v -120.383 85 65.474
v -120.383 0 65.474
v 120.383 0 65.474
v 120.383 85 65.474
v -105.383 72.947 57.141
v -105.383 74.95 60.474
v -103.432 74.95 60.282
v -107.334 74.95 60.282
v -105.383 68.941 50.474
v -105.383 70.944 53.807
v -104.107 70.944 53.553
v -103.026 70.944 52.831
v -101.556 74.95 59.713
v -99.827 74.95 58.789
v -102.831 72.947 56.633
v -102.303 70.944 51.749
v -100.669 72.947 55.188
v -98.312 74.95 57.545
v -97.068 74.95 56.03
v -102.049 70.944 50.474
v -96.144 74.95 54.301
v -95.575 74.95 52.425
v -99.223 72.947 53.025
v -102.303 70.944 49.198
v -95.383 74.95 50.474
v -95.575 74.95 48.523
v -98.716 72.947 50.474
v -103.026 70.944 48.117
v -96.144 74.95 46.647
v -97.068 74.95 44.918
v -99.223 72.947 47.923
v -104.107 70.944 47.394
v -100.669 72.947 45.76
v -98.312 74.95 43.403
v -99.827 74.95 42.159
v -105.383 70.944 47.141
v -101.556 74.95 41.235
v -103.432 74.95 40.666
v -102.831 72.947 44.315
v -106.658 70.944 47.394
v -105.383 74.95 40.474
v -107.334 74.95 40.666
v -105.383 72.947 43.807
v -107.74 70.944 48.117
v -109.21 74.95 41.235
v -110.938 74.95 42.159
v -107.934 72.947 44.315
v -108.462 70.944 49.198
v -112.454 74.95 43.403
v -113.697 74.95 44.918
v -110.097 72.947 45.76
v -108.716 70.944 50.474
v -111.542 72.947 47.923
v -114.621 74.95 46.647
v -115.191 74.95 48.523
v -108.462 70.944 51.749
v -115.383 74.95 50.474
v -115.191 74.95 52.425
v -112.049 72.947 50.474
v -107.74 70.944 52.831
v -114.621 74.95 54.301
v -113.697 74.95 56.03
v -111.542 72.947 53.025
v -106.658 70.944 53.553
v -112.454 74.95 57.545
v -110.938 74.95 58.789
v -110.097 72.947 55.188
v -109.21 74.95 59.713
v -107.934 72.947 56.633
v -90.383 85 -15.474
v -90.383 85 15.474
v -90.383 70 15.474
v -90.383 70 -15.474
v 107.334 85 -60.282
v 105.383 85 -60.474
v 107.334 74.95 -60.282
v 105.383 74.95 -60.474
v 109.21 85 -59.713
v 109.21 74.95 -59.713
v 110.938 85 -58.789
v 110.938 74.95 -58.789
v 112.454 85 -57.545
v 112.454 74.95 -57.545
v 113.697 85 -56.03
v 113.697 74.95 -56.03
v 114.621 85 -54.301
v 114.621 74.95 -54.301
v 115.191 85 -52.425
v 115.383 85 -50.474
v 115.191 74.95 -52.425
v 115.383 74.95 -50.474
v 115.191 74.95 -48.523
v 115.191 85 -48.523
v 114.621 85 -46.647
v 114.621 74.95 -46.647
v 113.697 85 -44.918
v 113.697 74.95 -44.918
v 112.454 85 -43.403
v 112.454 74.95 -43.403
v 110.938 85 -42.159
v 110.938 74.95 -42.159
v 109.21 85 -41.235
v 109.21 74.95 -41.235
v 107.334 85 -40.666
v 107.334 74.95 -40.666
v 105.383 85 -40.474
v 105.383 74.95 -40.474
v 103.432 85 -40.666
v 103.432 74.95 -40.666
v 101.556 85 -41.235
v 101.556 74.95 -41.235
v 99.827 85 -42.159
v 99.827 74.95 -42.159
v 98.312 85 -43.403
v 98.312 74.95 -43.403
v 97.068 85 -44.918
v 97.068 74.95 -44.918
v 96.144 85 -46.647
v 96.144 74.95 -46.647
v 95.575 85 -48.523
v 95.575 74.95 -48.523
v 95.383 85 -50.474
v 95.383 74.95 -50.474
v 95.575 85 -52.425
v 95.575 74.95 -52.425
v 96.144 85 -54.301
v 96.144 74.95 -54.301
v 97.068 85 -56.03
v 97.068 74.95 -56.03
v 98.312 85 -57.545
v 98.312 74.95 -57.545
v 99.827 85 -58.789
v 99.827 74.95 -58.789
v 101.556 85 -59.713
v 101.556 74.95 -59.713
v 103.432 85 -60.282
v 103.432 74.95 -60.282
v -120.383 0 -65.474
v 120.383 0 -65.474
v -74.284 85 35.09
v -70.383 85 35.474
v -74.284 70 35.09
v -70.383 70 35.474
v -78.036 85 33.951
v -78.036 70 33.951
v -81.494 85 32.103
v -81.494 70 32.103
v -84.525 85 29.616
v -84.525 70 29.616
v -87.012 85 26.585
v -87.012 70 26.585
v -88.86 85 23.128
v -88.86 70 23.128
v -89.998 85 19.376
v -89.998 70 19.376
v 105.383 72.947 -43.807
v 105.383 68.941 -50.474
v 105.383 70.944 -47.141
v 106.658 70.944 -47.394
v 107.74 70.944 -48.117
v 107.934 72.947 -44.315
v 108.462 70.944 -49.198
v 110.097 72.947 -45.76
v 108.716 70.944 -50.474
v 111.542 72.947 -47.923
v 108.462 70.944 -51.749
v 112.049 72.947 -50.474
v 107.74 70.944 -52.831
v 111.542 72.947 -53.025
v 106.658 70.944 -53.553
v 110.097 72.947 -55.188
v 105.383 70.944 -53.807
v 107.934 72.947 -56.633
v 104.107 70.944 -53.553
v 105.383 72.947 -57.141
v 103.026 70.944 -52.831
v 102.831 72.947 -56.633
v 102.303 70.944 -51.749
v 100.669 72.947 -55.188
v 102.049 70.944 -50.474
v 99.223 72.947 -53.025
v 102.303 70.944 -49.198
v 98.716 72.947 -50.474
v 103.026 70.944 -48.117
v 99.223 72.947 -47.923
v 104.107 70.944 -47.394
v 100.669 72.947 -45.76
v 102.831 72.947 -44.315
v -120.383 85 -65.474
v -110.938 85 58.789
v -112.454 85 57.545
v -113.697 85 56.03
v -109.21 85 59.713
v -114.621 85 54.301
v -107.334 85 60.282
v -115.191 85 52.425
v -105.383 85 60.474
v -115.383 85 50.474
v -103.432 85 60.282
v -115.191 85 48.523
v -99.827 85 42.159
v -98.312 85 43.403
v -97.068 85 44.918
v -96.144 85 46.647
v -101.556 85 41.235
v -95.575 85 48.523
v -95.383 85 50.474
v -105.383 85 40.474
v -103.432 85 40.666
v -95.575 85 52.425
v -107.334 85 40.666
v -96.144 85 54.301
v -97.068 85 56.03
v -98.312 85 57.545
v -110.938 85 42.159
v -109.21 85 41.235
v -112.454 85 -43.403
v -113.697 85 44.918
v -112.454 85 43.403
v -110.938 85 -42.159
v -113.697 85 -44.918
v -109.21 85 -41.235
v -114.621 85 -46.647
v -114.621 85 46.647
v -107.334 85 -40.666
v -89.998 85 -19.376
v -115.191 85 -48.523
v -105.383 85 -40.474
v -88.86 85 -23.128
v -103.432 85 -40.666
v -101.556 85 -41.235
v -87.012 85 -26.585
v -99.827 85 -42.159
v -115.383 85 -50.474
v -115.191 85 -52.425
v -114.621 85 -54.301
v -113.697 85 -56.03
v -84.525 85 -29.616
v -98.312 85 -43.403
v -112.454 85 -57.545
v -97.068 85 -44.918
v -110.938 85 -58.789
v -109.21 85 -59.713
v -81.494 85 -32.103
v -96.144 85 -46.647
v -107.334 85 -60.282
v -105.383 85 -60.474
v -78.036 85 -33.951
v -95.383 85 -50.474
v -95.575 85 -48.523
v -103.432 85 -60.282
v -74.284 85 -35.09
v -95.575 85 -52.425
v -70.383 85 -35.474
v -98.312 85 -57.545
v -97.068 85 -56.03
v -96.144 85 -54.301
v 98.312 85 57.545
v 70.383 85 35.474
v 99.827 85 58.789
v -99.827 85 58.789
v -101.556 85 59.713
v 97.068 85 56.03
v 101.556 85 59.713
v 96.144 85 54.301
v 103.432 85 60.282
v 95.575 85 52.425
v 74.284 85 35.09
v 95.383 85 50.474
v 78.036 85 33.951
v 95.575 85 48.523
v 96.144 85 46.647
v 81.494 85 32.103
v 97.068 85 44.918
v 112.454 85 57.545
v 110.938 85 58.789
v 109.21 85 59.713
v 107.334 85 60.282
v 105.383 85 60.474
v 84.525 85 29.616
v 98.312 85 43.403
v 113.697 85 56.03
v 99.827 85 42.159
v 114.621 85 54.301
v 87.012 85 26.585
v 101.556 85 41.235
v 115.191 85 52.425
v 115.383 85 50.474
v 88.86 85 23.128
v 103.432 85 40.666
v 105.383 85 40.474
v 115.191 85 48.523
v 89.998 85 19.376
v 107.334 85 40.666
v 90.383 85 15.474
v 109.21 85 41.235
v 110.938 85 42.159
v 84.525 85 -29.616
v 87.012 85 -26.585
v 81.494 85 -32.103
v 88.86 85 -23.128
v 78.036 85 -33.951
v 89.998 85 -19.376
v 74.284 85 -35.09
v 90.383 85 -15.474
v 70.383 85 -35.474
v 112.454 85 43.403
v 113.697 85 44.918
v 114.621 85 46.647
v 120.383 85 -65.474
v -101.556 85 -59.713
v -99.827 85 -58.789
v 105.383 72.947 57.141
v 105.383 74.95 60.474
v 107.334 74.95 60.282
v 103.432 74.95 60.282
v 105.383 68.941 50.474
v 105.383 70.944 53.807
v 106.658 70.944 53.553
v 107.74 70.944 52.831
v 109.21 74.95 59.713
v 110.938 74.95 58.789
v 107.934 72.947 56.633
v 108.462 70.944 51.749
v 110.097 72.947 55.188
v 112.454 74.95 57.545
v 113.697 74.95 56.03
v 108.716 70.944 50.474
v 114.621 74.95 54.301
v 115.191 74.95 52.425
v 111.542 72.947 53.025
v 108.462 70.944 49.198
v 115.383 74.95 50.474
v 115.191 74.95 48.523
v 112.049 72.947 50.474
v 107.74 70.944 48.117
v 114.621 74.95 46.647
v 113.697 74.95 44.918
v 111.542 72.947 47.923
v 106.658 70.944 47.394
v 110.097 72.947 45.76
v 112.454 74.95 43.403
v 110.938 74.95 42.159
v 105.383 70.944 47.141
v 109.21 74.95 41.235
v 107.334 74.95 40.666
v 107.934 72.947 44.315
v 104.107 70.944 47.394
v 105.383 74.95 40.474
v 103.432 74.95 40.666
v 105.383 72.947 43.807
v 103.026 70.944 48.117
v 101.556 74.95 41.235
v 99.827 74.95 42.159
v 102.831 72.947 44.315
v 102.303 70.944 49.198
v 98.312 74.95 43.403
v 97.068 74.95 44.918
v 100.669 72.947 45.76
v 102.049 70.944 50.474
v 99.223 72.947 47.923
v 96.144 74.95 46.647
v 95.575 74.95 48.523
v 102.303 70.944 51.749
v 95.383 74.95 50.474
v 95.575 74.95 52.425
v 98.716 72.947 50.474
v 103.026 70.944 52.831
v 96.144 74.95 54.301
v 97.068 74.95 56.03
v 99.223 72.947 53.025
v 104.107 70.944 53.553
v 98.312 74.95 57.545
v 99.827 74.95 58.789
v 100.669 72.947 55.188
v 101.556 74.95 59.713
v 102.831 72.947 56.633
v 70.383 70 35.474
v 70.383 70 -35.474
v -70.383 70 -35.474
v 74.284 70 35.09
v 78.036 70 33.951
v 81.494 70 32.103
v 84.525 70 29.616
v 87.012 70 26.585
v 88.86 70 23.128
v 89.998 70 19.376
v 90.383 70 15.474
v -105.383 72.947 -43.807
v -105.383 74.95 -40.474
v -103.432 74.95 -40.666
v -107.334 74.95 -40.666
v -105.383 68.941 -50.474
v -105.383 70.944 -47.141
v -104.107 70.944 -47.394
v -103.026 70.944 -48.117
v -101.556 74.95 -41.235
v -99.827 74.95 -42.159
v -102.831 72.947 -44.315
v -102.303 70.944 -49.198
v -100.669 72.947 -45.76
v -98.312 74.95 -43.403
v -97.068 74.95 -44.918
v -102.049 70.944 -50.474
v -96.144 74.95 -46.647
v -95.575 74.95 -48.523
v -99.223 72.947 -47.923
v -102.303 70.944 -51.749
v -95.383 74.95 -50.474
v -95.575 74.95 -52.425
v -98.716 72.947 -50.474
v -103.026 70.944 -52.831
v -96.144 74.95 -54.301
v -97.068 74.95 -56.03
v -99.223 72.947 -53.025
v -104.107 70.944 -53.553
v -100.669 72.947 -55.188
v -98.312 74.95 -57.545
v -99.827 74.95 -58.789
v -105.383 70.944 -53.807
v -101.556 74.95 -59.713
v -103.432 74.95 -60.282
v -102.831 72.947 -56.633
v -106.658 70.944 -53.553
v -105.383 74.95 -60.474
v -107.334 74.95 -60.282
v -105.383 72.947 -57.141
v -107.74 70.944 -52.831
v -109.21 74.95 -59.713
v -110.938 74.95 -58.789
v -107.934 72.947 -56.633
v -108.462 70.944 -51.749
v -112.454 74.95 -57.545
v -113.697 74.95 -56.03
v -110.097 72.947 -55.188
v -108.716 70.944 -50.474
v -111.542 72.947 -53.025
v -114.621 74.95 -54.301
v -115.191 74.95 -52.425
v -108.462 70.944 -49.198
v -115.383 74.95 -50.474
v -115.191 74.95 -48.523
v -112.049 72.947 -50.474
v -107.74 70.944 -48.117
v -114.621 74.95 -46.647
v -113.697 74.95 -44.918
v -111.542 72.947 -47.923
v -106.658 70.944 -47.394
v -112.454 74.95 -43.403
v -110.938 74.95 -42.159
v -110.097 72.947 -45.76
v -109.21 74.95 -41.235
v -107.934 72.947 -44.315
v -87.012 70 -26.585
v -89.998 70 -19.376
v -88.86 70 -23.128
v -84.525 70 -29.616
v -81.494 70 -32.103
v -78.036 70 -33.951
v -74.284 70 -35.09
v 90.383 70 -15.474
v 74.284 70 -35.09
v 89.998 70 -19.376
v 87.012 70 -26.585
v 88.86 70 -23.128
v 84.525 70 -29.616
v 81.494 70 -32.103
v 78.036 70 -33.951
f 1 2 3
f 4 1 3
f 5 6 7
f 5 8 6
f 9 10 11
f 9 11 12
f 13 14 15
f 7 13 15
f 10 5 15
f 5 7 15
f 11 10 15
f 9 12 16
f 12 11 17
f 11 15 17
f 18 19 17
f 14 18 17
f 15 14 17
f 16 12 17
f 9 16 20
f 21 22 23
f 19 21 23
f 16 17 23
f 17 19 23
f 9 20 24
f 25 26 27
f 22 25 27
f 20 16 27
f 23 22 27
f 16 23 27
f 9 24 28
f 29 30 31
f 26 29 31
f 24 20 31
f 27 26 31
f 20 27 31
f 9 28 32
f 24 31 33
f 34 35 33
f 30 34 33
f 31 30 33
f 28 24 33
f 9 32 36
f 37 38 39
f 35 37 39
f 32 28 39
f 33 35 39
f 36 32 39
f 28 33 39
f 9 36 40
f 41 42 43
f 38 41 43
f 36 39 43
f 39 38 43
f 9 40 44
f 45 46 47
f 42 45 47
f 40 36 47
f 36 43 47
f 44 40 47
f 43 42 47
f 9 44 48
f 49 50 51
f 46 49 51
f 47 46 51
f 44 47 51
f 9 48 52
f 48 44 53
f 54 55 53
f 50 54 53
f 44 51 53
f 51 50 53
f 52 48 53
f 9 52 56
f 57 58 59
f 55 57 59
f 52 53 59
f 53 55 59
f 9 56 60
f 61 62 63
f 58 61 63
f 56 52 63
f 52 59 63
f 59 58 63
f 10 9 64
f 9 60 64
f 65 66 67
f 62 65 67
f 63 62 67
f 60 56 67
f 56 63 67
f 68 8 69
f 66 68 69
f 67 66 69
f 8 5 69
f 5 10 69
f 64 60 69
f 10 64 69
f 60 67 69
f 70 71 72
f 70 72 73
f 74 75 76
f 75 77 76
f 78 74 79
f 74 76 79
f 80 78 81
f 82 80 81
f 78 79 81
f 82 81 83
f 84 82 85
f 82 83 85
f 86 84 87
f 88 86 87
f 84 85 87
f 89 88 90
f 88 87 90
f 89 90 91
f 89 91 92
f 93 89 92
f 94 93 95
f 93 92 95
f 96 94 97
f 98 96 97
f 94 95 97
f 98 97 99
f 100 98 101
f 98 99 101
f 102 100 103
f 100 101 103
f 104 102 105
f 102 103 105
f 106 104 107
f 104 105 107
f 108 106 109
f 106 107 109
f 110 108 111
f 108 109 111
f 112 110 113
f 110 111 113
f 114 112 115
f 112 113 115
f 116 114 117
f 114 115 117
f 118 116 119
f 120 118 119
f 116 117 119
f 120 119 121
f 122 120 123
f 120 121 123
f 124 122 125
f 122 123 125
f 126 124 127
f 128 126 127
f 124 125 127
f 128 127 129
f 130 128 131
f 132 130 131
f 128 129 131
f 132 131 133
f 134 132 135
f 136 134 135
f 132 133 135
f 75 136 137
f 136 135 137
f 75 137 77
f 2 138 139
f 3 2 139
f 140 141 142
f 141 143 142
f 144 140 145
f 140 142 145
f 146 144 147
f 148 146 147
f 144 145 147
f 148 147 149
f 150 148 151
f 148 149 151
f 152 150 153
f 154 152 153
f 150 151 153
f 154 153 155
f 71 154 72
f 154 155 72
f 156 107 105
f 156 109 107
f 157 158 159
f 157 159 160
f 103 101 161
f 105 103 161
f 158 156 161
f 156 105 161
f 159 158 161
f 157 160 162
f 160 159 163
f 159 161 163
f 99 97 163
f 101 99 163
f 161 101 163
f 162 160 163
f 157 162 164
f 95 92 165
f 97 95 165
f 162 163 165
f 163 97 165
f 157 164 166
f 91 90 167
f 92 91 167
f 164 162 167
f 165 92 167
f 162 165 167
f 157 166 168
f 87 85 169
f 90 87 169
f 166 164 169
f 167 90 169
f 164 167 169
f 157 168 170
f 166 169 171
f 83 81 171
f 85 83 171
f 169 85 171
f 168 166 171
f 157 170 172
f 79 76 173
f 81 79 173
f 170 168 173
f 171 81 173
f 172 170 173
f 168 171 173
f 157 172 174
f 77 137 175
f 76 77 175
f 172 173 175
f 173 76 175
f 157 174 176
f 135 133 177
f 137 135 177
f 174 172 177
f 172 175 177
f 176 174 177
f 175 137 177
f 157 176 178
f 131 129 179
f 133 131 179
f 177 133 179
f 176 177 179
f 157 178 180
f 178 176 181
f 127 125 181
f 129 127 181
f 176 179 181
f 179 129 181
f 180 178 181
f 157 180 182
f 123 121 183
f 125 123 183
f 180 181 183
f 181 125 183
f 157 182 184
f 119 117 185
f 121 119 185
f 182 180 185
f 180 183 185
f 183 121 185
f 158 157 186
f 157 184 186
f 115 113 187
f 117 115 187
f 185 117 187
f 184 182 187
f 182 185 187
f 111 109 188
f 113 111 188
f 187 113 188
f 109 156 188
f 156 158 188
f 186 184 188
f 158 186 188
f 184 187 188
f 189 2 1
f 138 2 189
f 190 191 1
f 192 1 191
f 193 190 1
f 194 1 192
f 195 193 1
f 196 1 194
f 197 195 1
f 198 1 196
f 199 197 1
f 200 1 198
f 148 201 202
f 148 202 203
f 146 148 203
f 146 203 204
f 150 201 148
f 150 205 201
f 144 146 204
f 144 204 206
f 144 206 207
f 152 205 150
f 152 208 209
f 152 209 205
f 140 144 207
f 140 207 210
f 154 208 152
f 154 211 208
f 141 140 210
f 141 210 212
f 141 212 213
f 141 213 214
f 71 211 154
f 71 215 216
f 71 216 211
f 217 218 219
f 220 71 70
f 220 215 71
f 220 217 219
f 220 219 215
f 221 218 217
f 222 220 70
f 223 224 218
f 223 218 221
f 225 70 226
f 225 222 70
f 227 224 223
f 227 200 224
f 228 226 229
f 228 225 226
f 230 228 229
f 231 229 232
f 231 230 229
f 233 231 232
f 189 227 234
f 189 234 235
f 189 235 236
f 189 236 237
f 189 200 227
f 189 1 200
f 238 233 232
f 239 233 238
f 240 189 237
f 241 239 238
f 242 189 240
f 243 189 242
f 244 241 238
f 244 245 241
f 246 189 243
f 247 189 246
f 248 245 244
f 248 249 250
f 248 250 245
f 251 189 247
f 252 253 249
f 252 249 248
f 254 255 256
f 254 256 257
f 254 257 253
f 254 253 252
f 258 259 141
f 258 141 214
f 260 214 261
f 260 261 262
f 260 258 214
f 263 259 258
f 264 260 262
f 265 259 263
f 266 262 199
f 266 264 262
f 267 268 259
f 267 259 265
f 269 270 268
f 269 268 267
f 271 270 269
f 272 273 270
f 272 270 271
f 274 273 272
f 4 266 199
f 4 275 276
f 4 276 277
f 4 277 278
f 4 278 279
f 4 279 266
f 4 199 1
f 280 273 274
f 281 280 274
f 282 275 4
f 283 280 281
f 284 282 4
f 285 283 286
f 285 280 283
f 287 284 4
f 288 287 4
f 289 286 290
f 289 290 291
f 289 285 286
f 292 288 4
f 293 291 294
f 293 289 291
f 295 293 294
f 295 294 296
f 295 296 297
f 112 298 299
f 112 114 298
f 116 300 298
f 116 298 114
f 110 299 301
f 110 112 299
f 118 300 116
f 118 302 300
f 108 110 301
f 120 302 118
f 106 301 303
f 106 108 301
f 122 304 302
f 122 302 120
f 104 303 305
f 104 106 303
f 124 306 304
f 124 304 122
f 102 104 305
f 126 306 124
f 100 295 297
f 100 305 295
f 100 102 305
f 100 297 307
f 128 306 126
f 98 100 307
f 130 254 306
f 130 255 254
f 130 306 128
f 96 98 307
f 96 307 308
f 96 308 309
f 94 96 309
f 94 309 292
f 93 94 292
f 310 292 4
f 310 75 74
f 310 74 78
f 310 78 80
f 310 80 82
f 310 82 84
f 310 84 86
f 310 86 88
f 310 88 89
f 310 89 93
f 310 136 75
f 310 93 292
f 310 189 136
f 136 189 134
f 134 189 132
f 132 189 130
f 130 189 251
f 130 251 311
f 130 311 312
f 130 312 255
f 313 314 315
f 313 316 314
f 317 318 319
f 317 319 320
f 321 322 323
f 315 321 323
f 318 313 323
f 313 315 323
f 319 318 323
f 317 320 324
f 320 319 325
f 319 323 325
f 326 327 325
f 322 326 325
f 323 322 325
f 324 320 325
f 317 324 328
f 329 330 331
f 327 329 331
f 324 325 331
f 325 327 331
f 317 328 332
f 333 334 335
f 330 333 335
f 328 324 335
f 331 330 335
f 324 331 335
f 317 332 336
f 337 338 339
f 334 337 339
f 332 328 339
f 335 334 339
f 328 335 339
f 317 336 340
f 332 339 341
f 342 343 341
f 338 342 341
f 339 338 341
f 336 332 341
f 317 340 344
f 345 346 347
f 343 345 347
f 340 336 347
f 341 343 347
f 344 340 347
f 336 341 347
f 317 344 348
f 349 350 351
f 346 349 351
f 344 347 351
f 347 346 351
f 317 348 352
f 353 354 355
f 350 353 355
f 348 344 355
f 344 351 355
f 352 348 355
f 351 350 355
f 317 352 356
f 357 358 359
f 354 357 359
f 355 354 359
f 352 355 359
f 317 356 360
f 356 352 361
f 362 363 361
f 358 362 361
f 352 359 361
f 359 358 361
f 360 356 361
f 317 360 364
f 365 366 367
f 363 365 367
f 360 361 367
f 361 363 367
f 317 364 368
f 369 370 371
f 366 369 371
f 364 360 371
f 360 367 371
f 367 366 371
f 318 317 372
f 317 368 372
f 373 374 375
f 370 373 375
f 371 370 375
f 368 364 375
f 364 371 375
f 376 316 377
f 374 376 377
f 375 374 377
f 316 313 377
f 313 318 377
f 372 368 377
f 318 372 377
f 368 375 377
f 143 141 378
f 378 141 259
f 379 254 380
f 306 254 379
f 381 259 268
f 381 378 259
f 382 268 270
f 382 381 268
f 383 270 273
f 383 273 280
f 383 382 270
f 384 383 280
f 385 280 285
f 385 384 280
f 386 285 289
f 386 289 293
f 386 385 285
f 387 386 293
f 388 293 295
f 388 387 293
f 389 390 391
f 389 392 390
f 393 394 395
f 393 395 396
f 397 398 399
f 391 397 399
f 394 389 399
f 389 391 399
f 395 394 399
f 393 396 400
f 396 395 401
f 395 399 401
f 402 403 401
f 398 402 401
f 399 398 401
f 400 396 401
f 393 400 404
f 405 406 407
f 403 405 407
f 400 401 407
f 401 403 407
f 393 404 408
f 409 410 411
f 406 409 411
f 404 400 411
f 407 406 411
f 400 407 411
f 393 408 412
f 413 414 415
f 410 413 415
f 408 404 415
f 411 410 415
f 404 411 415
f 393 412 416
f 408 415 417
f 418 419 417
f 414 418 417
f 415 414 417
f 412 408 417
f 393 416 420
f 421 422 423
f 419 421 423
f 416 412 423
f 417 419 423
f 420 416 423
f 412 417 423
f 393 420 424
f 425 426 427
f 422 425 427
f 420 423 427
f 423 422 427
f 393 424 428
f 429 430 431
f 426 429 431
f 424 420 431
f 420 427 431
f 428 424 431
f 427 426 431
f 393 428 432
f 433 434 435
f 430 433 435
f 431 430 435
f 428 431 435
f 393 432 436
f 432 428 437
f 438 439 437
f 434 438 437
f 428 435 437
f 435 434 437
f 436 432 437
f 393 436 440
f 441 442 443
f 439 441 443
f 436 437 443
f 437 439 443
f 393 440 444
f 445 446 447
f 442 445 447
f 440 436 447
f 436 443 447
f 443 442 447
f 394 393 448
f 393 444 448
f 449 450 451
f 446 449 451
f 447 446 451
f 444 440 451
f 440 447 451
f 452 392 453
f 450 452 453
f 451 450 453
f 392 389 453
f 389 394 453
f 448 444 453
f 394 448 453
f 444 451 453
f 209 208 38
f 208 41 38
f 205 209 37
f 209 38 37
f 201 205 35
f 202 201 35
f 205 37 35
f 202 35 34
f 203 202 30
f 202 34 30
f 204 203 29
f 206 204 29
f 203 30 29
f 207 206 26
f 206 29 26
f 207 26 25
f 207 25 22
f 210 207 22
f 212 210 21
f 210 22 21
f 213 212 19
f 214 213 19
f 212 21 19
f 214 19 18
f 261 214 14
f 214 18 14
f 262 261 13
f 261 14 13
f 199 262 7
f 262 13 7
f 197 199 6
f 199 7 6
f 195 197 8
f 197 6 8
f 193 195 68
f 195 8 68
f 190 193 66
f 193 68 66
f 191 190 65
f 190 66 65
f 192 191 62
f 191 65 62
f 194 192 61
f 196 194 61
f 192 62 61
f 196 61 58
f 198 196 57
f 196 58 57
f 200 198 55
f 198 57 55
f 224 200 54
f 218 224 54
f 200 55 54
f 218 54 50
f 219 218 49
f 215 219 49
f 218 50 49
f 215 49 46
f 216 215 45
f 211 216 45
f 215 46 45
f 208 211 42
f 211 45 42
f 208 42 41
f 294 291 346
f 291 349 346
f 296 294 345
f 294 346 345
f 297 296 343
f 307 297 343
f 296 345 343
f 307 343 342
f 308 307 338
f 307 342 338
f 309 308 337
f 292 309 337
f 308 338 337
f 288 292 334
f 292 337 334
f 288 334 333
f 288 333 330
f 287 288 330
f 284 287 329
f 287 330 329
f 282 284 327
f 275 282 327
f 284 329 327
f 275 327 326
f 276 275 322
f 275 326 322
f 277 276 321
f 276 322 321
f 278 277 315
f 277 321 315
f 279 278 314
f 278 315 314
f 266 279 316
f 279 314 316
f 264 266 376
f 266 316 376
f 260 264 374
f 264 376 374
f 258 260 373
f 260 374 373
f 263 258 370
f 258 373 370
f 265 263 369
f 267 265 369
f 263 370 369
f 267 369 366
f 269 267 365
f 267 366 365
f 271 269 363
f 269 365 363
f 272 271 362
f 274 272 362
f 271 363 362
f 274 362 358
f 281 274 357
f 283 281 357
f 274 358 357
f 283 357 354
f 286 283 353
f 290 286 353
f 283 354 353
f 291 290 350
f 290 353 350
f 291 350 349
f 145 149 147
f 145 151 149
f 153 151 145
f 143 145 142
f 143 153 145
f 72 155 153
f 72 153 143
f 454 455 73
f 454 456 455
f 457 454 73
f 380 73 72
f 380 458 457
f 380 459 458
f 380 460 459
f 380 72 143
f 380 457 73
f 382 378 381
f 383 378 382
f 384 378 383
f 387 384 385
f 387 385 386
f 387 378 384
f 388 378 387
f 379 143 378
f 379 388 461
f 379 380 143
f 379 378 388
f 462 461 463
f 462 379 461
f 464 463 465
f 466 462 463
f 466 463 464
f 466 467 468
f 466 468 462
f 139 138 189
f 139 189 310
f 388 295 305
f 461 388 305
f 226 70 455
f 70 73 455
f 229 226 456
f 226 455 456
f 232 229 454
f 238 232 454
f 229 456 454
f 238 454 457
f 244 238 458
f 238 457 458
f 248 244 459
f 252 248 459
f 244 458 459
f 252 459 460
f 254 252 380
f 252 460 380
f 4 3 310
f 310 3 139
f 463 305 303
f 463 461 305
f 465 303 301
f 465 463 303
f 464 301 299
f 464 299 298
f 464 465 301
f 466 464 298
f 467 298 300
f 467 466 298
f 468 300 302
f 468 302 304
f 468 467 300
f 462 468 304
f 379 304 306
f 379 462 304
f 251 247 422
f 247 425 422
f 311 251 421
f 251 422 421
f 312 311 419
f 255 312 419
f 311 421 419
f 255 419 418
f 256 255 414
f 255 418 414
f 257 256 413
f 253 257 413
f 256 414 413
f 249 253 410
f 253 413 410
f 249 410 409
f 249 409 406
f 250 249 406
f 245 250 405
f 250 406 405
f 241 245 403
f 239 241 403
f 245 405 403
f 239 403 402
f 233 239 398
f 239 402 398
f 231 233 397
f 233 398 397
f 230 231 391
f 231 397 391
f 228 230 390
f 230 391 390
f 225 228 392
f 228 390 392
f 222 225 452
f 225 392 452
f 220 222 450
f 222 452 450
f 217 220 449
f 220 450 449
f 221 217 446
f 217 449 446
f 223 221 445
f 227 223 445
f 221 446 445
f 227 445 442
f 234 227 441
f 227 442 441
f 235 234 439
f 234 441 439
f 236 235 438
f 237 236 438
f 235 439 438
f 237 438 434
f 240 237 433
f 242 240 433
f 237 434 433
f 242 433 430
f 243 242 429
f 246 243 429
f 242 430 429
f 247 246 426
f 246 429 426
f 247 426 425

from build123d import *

# Parameters (mm, degrees)
SKETCH3_W                  = 240.765342714
SKETCH3_H                  = 130.947670476
BOSS_EXTRUDE2_DEPTH        = 85
SKETCH4_W                  = 180.765342714
SKETCH4_H                  = 70.947670476
CUT_EXTRUDE1_DEPTH         = 15
F_20_0MM_DOWEL_HOLE1_D     = 20
F_20_0MM_DOWEL_HOLE1_DEPTH = 10.05
F_20_0MM_DOWEL_HOLE1_TIP   = 6.00860619
FILLET1_R                  = 20


with BuildPart() as part:
    # Sketch3 → Boss-Extrude2 (new body)
    with BuildSketch(Plane(origin=(0, 0, 0), x_dir=(1, 0, 0), z_dir=(0, 1, 0))):
        Rectangle(SKETCH3_W, SKETCH3_H)
    extrude(amount=BOSS_EXTRUDE2_DEPTH)

    # Sketch4 → Cut-Extrude1 (cut)
    with BuildSketch(Plane(origin=(0, 85, 0), x_dir=(1, 0, 0), z_dir=(0, 1, 0))):
        Rectangle(SKETCH4_W, SKETCH4_H)
    extrude(amount=-CUT_EXTRUDE1_DEPTH, mode=Mode.SUBTRACT)

    # Ø20.0mm Dowel Hole1
    with Locations(Plane(origin=(-105.382671357, 85, -50.473835238), x_dir=(0, 0, 1), z_dir=(0, 1, 0))):
        with Locations((0, 0), (100.947670476, 0), (0, 210.765342714), (100.947670476, 210.765342714)):
            Hole(F_20_0MM_DOWEL_HOLE1_D / 2, depth=F_20_0MM_DOWEL_HOLE1_DEPTH)
            with Locations((0, 0, -(F_20_0MM_DOWEL_HOLE1_DEPTH + F_20_0MM_DOWEL_HOLE1_TIP / 2))):  # 118° drill point
                Cone(0, F_20_0MM_DOWEL_HOLE1_D / 2, F_20_0MM_DOWEL_HOLE1_TIP, mode=Mode.SUBTRACT)

    # Fillet1
    fillet1_edges = [part.edges().sort_by_distance(p)[0] for p in [
        (90.382671357, 77.5, 35.473835238),
        (-90.382671357, 77.5, 35.473835238),
        (-90.382671357, 77.5, -35.473835238),
        (90.382671357, 77.5, -35.473835238),
    ]]
    fillet(fillet1_edges, radius=FILLET1_R)


solid = part.part
